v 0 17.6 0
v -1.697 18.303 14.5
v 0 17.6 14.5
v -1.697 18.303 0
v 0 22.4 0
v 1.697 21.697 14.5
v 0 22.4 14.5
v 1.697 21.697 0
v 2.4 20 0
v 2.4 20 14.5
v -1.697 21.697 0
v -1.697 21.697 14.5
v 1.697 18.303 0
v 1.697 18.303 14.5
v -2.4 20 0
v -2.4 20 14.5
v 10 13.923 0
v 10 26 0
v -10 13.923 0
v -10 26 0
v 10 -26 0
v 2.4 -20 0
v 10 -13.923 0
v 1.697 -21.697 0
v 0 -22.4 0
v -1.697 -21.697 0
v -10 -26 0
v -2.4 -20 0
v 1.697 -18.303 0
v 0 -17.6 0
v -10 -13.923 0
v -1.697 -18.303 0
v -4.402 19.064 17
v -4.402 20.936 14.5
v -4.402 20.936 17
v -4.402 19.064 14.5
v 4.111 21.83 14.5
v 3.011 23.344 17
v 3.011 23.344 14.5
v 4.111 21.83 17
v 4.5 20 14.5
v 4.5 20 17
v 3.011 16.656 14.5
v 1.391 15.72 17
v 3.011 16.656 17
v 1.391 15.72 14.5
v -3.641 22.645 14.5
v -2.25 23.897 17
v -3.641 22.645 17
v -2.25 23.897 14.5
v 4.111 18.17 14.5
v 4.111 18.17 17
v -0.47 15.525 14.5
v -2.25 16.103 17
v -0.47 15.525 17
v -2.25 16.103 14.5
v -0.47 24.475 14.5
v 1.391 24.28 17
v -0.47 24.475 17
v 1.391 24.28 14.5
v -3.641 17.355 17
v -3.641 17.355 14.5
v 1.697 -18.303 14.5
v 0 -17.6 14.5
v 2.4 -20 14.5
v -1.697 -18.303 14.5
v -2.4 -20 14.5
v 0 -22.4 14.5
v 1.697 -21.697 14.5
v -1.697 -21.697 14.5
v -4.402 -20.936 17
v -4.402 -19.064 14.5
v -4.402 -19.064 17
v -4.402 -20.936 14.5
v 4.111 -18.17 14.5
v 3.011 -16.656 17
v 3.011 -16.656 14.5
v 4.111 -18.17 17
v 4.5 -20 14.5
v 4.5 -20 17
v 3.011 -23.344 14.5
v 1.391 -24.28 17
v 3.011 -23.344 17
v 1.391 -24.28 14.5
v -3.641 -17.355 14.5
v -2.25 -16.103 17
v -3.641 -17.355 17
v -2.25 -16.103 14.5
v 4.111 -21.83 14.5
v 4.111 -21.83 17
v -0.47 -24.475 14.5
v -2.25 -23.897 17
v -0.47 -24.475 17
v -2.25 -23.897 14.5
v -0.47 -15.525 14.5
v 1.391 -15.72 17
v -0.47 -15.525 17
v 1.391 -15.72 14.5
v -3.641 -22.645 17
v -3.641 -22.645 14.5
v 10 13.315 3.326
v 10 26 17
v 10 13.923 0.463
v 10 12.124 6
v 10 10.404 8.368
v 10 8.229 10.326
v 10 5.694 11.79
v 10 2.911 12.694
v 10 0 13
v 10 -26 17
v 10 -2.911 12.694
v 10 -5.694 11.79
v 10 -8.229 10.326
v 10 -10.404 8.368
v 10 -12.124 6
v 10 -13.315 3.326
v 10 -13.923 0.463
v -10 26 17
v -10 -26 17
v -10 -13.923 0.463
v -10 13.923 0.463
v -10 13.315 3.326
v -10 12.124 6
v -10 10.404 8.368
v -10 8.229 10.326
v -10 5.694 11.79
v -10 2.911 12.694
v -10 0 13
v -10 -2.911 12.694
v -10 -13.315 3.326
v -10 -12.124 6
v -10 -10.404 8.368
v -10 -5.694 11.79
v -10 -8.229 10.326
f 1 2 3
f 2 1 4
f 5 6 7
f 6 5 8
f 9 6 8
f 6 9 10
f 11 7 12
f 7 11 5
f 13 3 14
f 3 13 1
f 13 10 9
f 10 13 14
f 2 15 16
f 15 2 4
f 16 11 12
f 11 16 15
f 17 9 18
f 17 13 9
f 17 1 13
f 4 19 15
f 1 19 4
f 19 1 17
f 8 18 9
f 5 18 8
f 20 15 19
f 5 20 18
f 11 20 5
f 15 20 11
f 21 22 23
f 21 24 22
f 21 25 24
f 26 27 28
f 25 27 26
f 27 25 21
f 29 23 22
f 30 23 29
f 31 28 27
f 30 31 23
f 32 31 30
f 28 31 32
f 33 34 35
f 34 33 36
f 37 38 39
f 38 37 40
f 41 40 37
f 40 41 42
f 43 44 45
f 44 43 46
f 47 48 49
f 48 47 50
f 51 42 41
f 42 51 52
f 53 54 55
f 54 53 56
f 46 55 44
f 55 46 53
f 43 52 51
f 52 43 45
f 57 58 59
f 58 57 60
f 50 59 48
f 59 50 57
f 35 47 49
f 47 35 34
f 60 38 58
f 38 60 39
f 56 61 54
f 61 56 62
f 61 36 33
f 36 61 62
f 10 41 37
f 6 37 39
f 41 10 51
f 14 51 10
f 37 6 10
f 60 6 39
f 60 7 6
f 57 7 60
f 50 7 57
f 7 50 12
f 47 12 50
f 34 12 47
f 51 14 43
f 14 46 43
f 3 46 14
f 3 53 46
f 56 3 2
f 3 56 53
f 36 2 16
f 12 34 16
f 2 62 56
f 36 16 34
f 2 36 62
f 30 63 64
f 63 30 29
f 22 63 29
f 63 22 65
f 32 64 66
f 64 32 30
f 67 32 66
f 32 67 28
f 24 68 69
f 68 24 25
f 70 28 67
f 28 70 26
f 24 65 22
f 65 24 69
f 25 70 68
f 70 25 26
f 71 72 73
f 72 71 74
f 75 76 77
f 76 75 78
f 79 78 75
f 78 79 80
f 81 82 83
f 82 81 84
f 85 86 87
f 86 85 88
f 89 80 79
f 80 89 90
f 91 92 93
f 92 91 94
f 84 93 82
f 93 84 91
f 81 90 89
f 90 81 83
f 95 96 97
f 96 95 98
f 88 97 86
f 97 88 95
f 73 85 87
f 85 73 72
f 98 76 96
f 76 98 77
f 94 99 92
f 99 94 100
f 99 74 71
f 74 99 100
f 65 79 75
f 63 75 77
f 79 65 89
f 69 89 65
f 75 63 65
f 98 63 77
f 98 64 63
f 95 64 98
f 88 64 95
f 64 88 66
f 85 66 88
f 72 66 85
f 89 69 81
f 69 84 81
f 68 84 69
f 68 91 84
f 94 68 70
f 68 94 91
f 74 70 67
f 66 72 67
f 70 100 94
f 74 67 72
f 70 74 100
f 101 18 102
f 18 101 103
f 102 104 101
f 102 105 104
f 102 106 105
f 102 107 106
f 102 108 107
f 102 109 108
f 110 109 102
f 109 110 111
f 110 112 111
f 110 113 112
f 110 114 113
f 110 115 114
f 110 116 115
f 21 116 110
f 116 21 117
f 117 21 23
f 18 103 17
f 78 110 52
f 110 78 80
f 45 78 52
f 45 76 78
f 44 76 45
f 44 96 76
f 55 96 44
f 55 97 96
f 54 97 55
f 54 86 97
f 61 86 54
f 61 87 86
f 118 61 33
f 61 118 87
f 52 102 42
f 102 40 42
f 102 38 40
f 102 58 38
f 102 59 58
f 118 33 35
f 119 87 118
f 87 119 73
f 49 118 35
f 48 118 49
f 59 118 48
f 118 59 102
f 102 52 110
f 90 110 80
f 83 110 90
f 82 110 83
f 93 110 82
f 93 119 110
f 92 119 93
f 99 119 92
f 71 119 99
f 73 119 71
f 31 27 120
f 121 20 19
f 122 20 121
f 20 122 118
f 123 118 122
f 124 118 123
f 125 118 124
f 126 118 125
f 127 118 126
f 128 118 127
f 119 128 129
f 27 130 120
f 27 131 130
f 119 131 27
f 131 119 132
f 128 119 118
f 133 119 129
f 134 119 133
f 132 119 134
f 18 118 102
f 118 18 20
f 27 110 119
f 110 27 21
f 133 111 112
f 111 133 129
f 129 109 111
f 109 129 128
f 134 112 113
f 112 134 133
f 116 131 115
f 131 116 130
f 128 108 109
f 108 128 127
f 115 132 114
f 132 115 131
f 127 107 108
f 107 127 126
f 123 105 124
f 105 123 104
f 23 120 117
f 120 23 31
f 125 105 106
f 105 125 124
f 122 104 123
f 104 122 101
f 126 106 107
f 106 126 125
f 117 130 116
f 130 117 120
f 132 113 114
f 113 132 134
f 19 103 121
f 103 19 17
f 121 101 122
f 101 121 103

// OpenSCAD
/*
Copyright © 2017 Richard Jorgensen
This work is free. You can redistribute it and/or modify it under the
terms of the Do What The Fuck You Want To Public License, Version 2,
as published by Sam Hocevar. See http://www.wtfpl.net/ for more details.
*/

/* [Motor Bracket] */
// Width of the bracket
width = 20;
// Radius of the motor
radius = 14;
// Thickness of bracket above motor
crown_height = 4;
// The amount of empty space to leave between brackets
gap = 1;

/* [Fastener] */
// Width of the fastener surface 
screw_plate_width = 12;
// Radius of bore for the screw
screw_radius = 2.4;
// Radius of counterbore for screw head
screw_head_radius = 4.5;
// Depth of counterbore for screw head
screw_head_height = 5;
// Type of screw head
screw_head_type = 1; //[0:None,1:Round,2:Hex,3:Tapered,4:Square(Carriage Bolt)]

/* [Hidden] */
bracket_height = radius + crown_height - gap;
bracket_length = (radius + screw_plate_width) * 2;

difference() {
    // Body
    translate([0, 0, bracket_height / 2])
    cube(size = [width, bracket_length, bracket_height], center = true);
    
    // Motor cutout
    translate([0, 0, -gap])
    rotate(a=180, v=[1,0,1])
    cylinder(h = width + 1, r = radius, center = true);
    
    for (dir = [1, -1]) {
        // Screw shaft
        translate([0, (radius + screw_plate_width / 2) * dir, bracket_height / 2])
        cylinder(h = bracket_height, r = screw_radius, center = true);

        // Screw head
        head_trans = [0, (radius + screw_plate_width / 2) * dir, bracket_height];
        if (screw_head_type == 1) {
            translate(head_trans)
            cylinder(r = screw_head_radius, h = screw_head_height, center = true);
        }
        if(screw_head_type == 2) {
            steps = 6;
            translate(head_trans)
            cylinder(r = screw_head_radius, h = screw_head_height, $fn = steps, center = true);
        }
        if(screw_head_type == 3) {
            /* TODO: Allow user to input chamfer angle of countersink head
                     instead of using the radii. */
            translate(head_trans)
            cylinder(r1 = screw_radius, r2 = screw_head_radius, h = screw_head_height, center = true);
        }
        if(screw_head_type == 4) {
            steps = 4;
            translate(head_trans)
            rotate(a=[0, 0, 45])
            cylinder(r = screw_head_radius, h = screw_head_height, $fn = steps, center = true);
        }
    }
}
